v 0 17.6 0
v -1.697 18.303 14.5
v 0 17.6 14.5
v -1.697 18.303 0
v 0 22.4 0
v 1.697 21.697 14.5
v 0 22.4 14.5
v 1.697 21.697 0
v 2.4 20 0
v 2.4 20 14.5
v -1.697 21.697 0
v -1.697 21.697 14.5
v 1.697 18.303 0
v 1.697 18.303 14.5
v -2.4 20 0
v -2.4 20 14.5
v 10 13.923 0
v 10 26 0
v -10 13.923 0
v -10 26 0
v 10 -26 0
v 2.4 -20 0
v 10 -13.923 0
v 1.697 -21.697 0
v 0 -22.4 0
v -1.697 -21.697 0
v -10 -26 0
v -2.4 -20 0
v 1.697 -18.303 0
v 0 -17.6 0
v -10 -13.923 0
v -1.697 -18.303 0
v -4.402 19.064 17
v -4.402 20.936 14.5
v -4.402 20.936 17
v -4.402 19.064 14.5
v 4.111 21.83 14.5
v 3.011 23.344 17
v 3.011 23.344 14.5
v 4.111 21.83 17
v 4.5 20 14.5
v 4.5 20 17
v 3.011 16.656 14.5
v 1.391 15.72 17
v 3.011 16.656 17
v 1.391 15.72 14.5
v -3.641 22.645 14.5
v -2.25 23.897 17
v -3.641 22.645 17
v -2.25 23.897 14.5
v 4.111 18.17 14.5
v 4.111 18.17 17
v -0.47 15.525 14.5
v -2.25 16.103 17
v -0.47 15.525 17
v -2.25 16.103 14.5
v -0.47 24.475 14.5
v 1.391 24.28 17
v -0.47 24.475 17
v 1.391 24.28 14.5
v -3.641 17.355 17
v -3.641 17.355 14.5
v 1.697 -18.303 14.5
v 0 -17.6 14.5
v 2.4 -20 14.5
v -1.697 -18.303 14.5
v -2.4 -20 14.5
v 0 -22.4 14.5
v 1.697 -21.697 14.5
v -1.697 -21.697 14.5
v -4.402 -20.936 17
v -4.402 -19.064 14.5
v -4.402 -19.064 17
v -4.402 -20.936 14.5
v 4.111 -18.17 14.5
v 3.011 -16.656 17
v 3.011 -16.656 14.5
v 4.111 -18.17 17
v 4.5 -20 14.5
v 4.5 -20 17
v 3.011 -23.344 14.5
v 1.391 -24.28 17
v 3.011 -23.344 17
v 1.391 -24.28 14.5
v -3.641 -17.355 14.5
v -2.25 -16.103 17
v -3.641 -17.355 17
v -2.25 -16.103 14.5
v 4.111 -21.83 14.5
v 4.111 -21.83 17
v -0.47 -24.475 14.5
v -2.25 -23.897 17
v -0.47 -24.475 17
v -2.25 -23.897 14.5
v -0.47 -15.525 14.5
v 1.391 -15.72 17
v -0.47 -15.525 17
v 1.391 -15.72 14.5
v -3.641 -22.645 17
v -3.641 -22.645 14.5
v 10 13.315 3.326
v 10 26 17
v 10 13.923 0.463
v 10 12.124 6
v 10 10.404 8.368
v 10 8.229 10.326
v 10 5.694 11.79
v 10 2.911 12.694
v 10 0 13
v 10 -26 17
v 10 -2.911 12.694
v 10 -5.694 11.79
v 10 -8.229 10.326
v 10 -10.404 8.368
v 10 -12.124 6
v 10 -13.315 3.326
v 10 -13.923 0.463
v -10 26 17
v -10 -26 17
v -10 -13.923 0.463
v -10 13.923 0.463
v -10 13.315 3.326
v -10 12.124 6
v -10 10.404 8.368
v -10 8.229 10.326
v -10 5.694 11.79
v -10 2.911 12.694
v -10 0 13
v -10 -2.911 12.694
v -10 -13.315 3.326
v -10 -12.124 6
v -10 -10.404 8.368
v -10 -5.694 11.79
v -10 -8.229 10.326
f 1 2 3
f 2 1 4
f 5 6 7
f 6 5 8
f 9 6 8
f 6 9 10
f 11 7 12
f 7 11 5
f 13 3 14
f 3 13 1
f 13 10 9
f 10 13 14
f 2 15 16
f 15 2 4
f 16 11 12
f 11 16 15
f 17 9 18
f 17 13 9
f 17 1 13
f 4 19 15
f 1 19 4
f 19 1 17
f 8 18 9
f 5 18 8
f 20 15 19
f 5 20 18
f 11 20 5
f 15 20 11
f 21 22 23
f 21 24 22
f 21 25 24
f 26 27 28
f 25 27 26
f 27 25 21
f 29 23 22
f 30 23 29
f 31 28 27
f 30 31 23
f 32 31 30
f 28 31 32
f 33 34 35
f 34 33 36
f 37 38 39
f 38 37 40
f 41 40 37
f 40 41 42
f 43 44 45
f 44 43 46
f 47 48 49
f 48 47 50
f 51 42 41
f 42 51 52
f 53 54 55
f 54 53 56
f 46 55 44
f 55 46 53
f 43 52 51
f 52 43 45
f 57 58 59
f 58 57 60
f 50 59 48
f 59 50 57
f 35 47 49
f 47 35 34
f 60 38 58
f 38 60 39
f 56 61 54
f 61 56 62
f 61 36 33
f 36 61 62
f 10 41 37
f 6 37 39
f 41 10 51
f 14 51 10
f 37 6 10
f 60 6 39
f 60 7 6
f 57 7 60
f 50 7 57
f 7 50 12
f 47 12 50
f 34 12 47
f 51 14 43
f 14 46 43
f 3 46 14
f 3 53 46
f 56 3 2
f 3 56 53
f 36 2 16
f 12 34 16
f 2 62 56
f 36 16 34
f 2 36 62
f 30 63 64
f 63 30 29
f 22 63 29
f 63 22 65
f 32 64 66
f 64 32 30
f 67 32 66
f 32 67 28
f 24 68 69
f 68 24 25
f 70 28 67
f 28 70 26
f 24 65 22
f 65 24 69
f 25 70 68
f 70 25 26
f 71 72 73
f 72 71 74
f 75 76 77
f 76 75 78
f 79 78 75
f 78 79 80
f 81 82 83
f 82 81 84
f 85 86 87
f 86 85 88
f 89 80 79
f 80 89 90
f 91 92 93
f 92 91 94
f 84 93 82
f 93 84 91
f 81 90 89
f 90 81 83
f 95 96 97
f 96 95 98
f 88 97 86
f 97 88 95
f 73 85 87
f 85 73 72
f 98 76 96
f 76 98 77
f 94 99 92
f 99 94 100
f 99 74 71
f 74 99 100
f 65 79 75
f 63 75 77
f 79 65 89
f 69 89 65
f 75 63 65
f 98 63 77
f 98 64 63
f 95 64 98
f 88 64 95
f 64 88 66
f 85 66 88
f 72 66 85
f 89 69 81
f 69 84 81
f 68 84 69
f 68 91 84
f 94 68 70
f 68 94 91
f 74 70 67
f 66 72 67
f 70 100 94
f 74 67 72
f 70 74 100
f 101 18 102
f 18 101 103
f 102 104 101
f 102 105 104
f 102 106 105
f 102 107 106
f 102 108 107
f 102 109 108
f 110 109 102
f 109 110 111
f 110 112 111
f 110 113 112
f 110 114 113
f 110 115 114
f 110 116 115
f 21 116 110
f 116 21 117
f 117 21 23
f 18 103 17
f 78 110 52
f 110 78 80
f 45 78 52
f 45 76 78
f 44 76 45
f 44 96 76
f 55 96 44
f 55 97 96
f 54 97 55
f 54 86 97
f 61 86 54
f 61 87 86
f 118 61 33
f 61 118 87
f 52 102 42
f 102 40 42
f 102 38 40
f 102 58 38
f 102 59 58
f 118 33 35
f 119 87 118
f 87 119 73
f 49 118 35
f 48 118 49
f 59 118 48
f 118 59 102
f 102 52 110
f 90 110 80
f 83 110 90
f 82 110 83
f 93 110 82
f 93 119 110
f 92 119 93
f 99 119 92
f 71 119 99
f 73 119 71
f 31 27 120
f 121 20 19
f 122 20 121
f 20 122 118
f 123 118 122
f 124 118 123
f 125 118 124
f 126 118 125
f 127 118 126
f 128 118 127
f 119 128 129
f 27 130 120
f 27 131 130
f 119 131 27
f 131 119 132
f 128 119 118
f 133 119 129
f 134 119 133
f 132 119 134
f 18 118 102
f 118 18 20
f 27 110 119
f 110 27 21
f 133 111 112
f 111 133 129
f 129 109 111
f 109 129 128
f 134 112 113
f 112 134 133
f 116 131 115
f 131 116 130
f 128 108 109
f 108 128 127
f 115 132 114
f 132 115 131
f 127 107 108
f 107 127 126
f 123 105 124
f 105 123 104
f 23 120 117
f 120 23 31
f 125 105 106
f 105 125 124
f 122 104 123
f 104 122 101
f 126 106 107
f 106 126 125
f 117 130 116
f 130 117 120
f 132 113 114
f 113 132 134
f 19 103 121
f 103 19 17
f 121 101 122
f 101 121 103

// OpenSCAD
/*
Copyright © 2017 Richard Jorgensen
This work is free. You can redistribute it and/or modify it under the
terms of the Do What The Fuck You Want To Public License, Version 2,
as published by Sam Hocevar. See http://www.wtfpl.net/ for more details.
*/

/* [Motor Bracket] */
// Width of the bracket
width = 20;
// Radius of the motor
radius = 14;
// Thickness of bracket above motor
crown_height = 4;
// The amount of empty space to leave between brackets
gap = 1;

/* [Fastener] */
// Width of the fastener surface 
screw_plate_width = 12;
// Radius of bore for the screw
screw_radius = 2.4;
// Radius of counterbore for screw head
screw_head_radius = 4.5;
// Depth of counterbore for screw head
screw_head_height = 5;
// Type of screw head
screw_head_type = 1; //[0:None,1:Round,2:Hex,3:Tapered,4:Square(Carriage Bolt)]

/* [Hidden] */
bracket_height = radius + crown_height - gap;
bracket_length = (radius + screw_plate_width) * 2;

difference() {
    // Body
    translate([0, 0, bracket_height / 2])
    cube(size = [width, bracket_length, bracket_height], center = true);
    
    // Motor cutout
    translate([0, 0, -gap])
    rotate(a=180, v=[1,0,1])
    cylinder(h = width + 1, r = radius, center = true);
    
    for (dir = [1, -1]) {
        // Screw shaft
        translate([0, (radius + screw_plate_width / 2) * dir, bracket_height / 2])
        cylinder(h = bracket_height, r = screw_radius, center = true);

        // Screw head
        head_trans = [0, (radius + screw_plate_width / 2) * dir, bracket_height];
        if (screw_head_type == 1) {
            translate(head_trans)
            cylinder(r = screw_head_radius, h = screw_head_height, center = true);
        }
        if(screw_head_type == 2) {
            steps = 6;
            translate(head_trans)
            cylinder(r = screw_head_radius, h = screw_head_height, $fn = steps, center = true);
        }
        if(screw_head_type == 3) {
            /* TODO: Allow user to input chamfer angle of countersink head
                     instead of using the radii. */
            translate(head_trans)
            cylinder(r1 = screw_radius, r2 = screw_head_radius, h = screw_head_height, center = true);
        }
        if(screw_head_type == 4) {
            steps = 4;
            translate(head_trans)
            rotate(a=[0, 0, 45])
            cylinder(r = screw_head_radius, h = screw_head_height, $fn = steps, center = true);
        }
    }
}
